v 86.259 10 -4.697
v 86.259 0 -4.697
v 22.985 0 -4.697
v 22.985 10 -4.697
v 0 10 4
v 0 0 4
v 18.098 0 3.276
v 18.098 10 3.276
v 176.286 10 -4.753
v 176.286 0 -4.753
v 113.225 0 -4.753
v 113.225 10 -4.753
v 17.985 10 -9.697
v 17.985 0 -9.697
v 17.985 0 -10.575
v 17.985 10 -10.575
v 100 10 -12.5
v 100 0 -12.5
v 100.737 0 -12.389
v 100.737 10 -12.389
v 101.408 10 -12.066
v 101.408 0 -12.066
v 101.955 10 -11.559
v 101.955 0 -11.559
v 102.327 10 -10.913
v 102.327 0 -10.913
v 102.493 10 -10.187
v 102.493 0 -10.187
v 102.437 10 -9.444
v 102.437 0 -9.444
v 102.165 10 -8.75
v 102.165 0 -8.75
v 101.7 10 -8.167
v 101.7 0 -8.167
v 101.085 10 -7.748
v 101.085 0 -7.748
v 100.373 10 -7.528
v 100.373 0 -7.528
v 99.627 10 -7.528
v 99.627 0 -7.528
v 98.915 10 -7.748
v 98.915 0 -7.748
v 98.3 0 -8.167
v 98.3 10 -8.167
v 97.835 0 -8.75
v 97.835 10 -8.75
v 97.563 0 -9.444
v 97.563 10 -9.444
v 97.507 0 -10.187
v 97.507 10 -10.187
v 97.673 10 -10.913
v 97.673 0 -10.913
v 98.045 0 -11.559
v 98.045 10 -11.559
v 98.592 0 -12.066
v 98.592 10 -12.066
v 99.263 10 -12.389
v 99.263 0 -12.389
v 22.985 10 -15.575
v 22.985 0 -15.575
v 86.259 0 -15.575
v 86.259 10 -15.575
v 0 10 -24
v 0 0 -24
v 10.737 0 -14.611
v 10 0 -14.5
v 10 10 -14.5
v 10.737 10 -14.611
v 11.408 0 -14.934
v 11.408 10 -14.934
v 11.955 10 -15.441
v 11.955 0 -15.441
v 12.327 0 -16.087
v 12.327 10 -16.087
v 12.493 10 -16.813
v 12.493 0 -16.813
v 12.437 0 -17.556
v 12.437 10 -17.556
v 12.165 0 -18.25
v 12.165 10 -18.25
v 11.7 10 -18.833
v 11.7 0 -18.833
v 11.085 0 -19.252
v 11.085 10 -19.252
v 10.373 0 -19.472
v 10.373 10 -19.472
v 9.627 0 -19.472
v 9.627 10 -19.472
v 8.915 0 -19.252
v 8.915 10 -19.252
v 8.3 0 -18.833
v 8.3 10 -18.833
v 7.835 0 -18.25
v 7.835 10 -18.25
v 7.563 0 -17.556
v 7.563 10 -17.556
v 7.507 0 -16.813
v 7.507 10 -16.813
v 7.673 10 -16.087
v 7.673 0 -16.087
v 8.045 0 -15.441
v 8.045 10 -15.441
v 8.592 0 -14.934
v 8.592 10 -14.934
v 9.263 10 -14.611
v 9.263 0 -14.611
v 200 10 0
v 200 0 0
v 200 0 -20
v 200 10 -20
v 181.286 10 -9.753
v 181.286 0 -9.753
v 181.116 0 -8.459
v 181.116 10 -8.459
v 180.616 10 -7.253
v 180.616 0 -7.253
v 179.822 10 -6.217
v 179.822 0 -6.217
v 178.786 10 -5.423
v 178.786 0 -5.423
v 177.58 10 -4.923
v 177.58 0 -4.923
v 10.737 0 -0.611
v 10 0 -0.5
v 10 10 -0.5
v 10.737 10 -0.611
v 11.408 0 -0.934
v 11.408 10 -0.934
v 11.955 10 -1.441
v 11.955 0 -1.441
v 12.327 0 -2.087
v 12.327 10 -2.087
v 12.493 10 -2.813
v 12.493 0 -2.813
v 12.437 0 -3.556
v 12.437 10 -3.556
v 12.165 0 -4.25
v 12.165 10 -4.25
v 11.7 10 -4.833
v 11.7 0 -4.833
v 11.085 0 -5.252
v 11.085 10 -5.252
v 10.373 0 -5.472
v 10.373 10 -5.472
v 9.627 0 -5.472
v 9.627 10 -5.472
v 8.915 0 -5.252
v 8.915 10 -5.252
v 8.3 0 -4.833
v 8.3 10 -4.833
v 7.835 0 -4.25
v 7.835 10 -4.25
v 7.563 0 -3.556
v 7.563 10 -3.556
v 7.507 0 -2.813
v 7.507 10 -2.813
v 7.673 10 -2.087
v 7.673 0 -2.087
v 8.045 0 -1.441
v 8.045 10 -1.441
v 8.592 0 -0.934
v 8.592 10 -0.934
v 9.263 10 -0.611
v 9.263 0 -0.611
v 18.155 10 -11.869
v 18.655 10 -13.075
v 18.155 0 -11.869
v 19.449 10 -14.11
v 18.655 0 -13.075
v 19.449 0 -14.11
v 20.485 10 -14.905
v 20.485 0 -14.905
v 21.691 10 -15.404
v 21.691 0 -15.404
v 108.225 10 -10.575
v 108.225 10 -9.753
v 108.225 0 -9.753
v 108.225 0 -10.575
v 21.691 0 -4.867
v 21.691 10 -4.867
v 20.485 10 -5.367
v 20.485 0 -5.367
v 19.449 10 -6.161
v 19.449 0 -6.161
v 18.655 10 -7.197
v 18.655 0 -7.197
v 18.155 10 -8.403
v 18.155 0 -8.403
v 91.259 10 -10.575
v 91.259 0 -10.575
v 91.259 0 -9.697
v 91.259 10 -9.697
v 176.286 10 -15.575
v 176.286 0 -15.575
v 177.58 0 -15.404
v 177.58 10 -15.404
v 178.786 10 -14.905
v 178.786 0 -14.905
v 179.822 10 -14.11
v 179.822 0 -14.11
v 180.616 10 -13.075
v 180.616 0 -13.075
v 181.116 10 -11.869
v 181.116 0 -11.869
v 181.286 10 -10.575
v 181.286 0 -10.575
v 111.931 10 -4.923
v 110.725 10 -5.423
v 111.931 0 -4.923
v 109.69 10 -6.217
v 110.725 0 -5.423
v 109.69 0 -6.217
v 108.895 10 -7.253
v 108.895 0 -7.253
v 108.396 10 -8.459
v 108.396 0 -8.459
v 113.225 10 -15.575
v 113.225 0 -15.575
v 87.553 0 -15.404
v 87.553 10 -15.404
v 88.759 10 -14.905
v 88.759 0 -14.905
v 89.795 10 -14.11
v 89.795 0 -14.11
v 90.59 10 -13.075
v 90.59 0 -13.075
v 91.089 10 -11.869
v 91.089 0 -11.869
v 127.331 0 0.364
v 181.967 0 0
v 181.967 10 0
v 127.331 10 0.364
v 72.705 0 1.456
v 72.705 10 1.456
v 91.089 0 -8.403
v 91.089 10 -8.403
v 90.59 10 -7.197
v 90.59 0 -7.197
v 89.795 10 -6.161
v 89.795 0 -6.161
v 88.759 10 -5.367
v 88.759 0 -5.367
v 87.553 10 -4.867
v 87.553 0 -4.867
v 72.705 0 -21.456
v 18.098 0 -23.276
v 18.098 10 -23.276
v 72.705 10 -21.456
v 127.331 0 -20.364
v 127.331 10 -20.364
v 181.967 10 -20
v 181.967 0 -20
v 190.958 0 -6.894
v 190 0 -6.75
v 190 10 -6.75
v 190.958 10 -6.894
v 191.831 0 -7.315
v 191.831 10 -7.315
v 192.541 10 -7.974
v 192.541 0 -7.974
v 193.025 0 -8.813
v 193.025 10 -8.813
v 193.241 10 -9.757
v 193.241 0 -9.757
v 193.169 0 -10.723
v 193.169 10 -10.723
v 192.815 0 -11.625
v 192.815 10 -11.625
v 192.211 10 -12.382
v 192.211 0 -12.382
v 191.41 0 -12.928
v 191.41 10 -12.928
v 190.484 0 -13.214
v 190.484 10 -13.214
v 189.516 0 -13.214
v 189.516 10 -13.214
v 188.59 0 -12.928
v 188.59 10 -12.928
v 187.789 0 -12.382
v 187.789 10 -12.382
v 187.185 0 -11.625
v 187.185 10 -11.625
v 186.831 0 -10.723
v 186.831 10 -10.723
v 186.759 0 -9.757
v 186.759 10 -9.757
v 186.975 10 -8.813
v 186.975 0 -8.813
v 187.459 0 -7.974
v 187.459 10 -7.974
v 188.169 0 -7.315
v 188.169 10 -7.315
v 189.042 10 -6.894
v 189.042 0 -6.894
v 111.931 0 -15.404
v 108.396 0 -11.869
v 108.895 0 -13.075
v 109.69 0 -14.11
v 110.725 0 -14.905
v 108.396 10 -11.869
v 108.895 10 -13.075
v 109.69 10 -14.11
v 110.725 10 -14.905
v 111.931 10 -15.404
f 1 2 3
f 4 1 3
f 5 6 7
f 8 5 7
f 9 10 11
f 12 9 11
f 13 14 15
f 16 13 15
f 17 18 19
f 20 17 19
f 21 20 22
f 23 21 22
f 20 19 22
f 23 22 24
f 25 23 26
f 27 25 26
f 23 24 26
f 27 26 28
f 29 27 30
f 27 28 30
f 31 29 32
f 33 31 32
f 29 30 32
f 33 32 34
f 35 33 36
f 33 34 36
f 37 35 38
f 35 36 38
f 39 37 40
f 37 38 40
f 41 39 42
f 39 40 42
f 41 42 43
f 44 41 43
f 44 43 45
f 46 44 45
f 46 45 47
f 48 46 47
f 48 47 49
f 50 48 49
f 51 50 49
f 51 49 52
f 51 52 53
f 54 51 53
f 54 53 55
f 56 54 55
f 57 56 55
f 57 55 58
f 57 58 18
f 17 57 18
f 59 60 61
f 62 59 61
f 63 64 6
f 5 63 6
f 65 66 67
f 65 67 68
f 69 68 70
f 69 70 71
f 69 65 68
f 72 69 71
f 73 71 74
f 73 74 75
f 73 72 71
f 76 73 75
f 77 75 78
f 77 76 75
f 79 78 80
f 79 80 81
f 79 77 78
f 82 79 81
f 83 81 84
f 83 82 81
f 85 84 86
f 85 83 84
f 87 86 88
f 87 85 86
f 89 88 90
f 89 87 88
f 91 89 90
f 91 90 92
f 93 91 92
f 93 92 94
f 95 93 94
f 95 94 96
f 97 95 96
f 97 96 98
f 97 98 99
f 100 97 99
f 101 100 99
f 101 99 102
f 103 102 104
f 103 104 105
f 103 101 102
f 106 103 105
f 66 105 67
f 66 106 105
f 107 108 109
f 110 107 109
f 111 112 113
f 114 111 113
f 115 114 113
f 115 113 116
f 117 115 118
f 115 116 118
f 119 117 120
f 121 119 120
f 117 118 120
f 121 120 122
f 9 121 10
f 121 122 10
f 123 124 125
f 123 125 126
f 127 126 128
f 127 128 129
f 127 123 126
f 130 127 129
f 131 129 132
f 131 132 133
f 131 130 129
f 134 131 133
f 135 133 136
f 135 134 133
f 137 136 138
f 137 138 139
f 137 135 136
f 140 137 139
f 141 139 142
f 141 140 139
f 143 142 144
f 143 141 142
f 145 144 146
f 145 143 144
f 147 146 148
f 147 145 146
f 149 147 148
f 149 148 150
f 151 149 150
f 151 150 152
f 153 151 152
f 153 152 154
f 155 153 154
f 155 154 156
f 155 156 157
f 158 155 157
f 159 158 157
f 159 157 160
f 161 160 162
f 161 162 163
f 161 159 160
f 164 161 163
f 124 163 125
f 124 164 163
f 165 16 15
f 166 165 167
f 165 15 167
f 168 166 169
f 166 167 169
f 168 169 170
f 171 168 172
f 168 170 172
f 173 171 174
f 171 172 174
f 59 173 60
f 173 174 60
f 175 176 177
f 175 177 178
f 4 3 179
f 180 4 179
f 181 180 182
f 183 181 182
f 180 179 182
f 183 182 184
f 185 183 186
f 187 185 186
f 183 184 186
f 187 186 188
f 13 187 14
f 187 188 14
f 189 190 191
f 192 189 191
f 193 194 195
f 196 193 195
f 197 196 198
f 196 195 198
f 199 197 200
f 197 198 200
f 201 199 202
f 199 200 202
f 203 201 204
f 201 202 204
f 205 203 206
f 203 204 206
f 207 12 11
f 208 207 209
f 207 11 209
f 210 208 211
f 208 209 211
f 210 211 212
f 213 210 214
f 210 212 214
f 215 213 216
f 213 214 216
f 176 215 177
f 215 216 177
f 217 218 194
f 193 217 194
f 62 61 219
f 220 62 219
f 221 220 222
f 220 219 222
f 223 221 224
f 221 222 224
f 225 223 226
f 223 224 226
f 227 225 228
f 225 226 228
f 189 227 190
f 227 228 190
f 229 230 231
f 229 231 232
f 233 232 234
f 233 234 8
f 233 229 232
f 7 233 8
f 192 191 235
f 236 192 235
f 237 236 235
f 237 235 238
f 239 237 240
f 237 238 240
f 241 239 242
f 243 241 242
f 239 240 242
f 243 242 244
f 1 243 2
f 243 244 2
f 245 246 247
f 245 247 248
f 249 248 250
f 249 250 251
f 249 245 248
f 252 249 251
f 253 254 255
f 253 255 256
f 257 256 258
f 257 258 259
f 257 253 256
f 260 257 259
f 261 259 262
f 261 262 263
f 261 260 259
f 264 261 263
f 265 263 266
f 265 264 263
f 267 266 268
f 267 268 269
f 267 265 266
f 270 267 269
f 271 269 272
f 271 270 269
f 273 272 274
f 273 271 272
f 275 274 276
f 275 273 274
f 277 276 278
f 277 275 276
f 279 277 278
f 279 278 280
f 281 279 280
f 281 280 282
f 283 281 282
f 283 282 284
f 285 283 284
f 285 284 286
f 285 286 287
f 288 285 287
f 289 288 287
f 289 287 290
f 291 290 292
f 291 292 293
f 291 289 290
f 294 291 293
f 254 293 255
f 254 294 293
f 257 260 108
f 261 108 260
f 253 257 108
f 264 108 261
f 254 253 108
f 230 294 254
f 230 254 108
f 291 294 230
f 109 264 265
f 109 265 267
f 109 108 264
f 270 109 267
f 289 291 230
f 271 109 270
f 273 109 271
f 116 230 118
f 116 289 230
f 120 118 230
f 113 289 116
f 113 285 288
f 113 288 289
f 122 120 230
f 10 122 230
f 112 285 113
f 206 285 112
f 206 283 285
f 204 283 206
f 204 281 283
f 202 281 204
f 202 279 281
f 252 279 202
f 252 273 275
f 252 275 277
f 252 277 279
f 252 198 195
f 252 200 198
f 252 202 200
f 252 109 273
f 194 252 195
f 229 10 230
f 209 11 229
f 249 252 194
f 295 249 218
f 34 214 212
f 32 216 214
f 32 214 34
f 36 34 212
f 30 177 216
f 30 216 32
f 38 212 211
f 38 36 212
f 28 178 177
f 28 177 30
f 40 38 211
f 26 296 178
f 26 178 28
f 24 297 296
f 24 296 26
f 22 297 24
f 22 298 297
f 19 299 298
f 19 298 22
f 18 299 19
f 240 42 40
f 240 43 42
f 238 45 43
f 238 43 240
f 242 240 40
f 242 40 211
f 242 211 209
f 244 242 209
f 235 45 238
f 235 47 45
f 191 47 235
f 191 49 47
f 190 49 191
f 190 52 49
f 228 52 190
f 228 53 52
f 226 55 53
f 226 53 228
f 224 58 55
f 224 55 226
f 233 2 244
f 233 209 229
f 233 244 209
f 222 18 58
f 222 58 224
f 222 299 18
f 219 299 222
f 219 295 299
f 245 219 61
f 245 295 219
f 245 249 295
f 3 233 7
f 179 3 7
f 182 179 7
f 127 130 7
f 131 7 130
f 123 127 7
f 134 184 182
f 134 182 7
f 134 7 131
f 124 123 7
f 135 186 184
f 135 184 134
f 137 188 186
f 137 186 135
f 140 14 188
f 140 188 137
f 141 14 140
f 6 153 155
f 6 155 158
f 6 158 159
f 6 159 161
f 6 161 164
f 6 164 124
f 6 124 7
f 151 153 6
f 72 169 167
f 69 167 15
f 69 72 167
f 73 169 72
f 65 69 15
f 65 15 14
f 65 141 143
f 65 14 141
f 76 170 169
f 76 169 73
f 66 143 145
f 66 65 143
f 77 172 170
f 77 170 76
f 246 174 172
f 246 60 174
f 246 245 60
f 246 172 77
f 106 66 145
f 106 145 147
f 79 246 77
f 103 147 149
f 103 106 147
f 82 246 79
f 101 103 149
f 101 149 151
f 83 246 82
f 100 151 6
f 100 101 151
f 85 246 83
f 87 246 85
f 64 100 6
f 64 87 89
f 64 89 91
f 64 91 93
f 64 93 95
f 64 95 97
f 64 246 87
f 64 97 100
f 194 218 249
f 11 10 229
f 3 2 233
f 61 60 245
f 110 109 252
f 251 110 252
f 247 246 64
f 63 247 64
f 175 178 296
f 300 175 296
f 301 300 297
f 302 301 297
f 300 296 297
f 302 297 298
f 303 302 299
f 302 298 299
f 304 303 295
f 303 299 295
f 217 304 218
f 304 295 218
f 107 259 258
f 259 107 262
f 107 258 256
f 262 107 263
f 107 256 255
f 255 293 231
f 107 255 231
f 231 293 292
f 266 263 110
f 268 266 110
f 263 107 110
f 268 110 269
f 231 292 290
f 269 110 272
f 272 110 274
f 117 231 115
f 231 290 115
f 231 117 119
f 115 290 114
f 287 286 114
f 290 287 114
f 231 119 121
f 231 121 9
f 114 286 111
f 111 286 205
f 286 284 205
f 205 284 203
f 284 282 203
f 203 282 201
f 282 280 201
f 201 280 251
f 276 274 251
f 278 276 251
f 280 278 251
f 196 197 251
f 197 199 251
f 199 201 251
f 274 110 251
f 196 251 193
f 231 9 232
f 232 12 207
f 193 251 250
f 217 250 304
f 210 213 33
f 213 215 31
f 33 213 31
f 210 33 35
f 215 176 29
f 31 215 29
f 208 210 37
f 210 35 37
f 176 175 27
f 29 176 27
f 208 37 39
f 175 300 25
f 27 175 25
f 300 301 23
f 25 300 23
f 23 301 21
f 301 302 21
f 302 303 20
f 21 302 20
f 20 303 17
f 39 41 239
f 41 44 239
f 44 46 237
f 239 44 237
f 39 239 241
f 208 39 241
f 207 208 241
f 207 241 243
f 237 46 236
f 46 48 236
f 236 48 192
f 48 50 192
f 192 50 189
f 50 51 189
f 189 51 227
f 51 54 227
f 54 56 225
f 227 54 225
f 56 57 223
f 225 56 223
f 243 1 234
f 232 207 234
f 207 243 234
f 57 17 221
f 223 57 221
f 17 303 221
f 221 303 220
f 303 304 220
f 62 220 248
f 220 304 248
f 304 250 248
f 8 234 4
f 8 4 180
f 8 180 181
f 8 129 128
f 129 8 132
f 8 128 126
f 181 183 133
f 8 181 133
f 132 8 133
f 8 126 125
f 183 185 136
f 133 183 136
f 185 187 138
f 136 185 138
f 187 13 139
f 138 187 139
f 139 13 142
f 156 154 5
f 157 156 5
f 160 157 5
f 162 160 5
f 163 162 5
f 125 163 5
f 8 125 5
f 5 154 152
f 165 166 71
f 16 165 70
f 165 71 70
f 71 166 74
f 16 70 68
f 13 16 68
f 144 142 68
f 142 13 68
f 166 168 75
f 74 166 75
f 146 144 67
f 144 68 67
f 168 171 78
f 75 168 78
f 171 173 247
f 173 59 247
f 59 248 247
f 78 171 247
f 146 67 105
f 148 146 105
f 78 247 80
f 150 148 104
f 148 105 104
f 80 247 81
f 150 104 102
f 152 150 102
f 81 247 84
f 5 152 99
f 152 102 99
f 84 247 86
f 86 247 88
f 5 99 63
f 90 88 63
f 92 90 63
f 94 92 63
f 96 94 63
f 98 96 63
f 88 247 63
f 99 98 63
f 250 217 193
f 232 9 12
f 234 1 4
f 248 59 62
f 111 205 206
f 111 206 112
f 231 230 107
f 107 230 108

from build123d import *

# Parameters (mm, degrees)
SZKIC1_R                    = 1.97098021
SZKIC1_R_2                  = 3.25
SZKIC1_R_3                  = 2.5
DODANIE_WYCI_GNI_CIE1_DEPTH = 10
ZAOKR_GLENIE1_R             = 4100
OTW_R_GWINTOWANY_M62_D      = 5
OTW_R_GWINTOWANY_M62_DEPTH  = 15.497848452
OTW_R_GWINTOWANY_M62_TIP    = 1.502151548


with BuildPart() as part:
    # Szkic1 → Dodanie-wyciągnięcie1 (new body)
    with BuildSketch(Plane(origin=(0, 0, 0), x_dir=(1, 0, 0), z_dir=(0, 1, 0))):
        Polygon((200, 0), (200, 20), (100, 20), (0, 24), (0, -4), (100, 0), align=None)
        with Locations(Location((100, 10, 0), (0, 0, 270))):
            Circle(SZKIC1_R, mode=Mode.SUBTRACT)
        with Locations(Location((190, 10, 0), (0, 0, 270))):
            Circle(SZKIC1_R_2, mode=Mode.SUBTRACT)
        with Locations(Location((10, 17, 0), (0, 0, 270))):
            Circle(SZKIC1_R_3, mode=Mode.SUBTRACT)
        with Locations(Location((10, 3, 0), (0, 0, 270))):
            Circle(SZKIC1_R_3, mode=Mode.SUBTRACT)
        with BuildLine():
            Line((22.984822323, 15.57457628), (86.25939238, 15.57457628))
            ThreePointArc((86.25939238, 15.57457628), (89.794926286, 14.110110186), (91.25939238, 10.57457628))
            Line((91.25939238, 10.57457628), (91.25939238, 9.696719379))
            ThreePointArc((91.25939238, 9.696719379), (89.794926286, 6.161185473), (86.25939238, 4.696719379))
            Line((86.25939238, 4.696719379), (22.984822323, 4.696719379))
            ThreePointArc((22.984822323, 4.696719379), (19.449288417, 6.161185473), (17.984822323, 9.696719379))
            Line((17.984822323, 9.696719379), (17.984822323, 10.57457628))
            ThreePointArc((17.984822323, 10.57457628), (19.449288417, 14.110110186), (22.984822323, 15.57457628))
        make_face(mode=Mode.SUBTRACT)
        with BuildLine():
            Line((113.225148066, 15.57457628), (176.286209663, 15.57457628))
            ThreePointArc((176.286209663, 15.57457628), (179.821743569, 14.110110186), (181.286209663, 10.57457628))
            Line((181.286209663, 10.57457628), (181.286209663, 9.752776346))
            ThreePointArc((181.286209663, 9.752776346), (179.821743569, 6.21724244), (176.286209663, 4.752776346))
            Line((176.286209663, 4.752776346), (113.225148066, 4.752776346))
            ThreePointArc((113.225148066, 4.752776346), (109.68961416, 6.21724244), (108.225148066, 9.752776346))
            Line((108.225148066, 9.752776346), (108.225148066, 10.57457628))
            ThreePointArc((108.225148066, 10.57457628), (109.68961416, 14.110110186), (113.225148066, 15.57457628))
        make_face(mode=Mode.SUBTRACT)
    extrude(amount=DODANIE_WYCI_GNI_CIE1_DEPTH)

    # Zaokrąglenie1
    # the kernel refuses this fillet: 4100 mm, written as the material it adds along each edge
    with BuildSketch(Plane(origin=(100, 0, -20), x_dir=(1, 0, 0), z_dir=(0, 1, 0)), Plane(origin=(100, 0, 0), x_dir=(-0.9992009587217893, 0, 0.03996803834887583), z_dir=(0, 1, 0))) as zaokr_glenie1_piece_1:
        with BuildLine():
            CenterArc((ZAOKR_GLENIE1_R * 0.0199920063936, ZAOKR_GLENIE1_R), ZAOKR_GLENIE1_R, 267.709389957, 2.290610043)
            Line((-ZAOKR_GLENIE1_R * 0.0199760319553, ZAOKR_GLENIE1_R * 0.000799041278211), (0, 0))
            Line((0, 0), (ZAOKR_GLENIE1_R * 0.0199920063936, 0))
        make_face()
    extrude(amount=10)

    # Otwór gwintowany M62
    with Locations(Plane(origin=(100, 10, -10), x_dir=(0, 0, 1), z_dir=(0, 1, 0))):
        with Locations((0, 0)):
            Hole(OTW_R_GWINTOWANY_M62_D / 2, depth=OTW_R_GWINTOWANY_M62_DEPTH)
            with Locations((0, 0, -(OTW_R_GWINTOWANY_M62_DEPTH + OTW_R_GWINTOWANY_M62_TIP / 2))):  # 118° drill point
                Cone(0, OTW_R_GWINTOWANY_M62_D / 2, OTW_R_GWINTOWANY_M62_TIP, mode=Mode.SUBTRACT)


solid = part.part
